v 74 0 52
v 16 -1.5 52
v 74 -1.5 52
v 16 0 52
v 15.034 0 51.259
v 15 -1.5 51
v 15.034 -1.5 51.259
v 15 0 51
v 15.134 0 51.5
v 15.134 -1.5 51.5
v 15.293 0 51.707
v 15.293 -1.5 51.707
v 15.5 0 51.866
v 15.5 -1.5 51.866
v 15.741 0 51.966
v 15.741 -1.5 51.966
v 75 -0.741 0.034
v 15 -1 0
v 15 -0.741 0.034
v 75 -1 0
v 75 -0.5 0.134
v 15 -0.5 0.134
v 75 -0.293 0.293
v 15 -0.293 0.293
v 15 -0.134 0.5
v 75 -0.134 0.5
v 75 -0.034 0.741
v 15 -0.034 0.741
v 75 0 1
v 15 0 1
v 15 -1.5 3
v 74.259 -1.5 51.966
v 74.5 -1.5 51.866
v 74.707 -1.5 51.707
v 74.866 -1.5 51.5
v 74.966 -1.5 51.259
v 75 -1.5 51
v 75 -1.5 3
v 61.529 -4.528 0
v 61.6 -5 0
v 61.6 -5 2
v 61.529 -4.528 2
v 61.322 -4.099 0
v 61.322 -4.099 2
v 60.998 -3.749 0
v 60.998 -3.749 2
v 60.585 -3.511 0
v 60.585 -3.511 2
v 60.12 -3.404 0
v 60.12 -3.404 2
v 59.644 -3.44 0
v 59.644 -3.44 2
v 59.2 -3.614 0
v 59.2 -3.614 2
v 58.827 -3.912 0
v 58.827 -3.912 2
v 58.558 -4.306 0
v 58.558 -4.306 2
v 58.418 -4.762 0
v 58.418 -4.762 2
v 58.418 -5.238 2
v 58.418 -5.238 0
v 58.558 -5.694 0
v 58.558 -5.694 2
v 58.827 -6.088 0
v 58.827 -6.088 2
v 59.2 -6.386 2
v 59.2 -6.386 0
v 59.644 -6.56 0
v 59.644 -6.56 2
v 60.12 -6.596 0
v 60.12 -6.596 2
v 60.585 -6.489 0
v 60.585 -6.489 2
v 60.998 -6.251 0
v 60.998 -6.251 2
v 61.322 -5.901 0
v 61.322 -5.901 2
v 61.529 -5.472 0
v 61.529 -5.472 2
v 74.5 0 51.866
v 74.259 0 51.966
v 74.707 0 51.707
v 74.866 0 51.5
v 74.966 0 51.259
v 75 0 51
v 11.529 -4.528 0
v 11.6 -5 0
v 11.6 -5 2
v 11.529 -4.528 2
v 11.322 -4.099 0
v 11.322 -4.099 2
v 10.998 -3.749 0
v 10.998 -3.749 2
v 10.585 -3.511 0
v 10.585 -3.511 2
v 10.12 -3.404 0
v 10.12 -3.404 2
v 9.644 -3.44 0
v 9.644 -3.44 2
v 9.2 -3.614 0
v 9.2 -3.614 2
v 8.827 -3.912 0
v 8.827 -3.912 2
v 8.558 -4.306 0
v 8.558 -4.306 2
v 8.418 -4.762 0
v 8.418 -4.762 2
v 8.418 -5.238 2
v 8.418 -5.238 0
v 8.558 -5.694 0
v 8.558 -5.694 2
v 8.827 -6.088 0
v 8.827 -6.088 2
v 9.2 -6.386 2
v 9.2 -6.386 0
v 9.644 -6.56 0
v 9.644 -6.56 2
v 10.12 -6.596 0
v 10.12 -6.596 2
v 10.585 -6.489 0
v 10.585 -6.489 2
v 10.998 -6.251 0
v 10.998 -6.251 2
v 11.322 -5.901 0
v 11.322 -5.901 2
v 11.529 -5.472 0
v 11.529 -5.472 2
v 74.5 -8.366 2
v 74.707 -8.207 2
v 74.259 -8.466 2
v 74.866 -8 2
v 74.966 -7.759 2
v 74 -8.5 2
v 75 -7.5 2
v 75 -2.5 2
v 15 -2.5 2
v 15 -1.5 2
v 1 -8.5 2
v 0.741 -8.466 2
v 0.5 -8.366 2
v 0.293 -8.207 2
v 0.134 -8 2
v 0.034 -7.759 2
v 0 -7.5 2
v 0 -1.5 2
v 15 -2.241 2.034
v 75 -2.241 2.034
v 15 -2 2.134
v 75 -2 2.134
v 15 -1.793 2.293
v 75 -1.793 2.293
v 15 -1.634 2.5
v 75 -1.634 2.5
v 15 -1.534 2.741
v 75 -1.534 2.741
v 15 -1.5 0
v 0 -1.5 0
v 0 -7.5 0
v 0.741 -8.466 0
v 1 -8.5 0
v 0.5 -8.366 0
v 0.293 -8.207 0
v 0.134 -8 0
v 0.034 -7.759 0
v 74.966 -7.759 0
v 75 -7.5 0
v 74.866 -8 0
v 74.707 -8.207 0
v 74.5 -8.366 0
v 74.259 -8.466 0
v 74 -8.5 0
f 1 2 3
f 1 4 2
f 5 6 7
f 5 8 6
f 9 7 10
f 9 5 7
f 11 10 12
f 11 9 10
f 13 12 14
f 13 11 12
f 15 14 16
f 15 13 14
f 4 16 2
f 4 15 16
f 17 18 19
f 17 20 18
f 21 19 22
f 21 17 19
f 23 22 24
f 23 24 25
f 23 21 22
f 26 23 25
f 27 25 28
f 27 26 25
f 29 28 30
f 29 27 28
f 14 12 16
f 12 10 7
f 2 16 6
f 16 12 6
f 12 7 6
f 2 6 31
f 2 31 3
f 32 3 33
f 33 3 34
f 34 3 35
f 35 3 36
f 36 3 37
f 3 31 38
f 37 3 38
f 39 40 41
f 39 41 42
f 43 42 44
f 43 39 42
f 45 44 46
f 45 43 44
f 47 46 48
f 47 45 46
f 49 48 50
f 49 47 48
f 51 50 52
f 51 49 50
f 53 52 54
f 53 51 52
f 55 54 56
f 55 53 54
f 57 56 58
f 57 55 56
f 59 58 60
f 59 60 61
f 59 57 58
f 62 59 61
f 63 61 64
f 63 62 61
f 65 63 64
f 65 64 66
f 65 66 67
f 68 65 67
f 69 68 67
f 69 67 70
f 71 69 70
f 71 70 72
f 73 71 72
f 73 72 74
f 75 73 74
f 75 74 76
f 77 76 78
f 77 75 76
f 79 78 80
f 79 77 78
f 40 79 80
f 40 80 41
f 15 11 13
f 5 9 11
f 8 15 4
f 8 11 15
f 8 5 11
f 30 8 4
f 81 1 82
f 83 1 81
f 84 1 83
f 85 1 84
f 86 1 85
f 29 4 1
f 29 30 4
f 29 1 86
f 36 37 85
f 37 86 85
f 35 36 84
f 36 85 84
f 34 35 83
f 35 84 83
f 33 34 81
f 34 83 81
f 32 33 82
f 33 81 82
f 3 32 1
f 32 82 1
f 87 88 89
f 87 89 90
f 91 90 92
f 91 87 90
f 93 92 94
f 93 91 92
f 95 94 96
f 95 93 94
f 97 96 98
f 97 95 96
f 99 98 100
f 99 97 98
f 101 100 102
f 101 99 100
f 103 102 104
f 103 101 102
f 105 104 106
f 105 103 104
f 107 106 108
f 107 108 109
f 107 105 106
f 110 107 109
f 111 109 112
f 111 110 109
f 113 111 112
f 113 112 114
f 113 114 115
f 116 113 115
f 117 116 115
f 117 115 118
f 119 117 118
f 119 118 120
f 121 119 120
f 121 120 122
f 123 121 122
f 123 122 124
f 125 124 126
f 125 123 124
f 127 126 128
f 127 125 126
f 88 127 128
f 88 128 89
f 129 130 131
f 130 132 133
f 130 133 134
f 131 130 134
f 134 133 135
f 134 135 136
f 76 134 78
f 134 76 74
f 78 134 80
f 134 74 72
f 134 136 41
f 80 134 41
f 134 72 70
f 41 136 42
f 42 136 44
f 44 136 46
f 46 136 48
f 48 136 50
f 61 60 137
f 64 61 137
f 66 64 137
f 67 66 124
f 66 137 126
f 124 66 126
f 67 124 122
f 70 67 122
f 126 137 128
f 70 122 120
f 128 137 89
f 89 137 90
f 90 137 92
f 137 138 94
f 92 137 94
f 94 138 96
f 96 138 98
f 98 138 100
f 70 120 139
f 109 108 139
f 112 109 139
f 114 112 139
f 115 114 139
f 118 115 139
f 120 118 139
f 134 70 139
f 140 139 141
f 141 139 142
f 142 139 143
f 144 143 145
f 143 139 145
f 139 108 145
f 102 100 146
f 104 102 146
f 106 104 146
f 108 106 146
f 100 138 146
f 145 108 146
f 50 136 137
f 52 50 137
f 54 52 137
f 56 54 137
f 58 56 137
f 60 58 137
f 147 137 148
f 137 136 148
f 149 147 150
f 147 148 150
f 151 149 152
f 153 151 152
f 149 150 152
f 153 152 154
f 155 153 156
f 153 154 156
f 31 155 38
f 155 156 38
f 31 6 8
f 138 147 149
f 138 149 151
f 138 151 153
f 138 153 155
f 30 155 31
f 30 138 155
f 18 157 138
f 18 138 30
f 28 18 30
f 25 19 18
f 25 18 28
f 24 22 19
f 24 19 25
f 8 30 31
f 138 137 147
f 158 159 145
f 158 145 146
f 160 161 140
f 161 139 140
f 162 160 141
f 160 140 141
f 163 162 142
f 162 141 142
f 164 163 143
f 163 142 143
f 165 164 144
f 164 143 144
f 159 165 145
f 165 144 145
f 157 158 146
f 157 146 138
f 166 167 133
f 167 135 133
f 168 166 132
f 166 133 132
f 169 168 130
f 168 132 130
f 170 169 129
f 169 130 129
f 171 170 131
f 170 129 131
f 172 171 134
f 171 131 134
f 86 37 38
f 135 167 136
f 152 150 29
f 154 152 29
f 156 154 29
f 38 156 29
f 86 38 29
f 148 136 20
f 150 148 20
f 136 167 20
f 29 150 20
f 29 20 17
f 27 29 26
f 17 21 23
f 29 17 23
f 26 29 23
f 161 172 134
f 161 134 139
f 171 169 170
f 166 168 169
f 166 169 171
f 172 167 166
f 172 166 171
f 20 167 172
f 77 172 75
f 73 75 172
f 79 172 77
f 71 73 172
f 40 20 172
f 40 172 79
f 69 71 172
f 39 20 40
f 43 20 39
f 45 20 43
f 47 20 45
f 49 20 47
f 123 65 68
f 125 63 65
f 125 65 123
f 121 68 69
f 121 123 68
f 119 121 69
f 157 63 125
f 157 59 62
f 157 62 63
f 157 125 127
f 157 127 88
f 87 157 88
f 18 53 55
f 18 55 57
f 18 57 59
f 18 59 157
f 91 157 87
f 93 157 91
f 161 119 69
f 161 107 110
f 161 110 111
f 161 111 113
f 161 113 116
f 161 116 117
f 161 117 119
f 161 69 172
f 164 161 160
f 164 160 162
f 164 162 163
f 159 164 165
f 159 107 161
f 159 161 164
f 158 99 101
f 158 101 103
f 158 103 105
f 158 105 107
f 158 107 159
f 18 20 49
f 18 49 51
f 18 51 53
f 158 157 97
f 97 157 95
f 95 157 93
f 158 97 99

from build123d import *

# Parameters (mm, degrees)
SKETCH_1_R      = 1.6
EXTRUDE_1_DEPTH = 2
SKETCH_2_W      = 60
SKETCH_2_H      = 1.5
EXTRUDE_2_DEPTH = 50
FILLET_1_R      = 1


with BuildPart() as part:
    # 草图1 → 凸台-拉伸1 (new body)
    with BuildSketch(Plane.XY):
        Polygon((15, 0), (75, 0), (75, -8.5), (0, -8.5), (0, -1.5), (15, -1.5), align=None)
        with Locations((10, -5)):
            Circle(SKETCH_1_R, mode=Mode.SUBTRACT)
        with Locations((60, -5)):
            Circle(SKETCH_1_R, mode=Mode.SUBTRACT)
    extrude(amount=EXTRUDE_1_DEPTH)

    # 草图2 → 凸台-拉伸2 (add)
    with BuildSketch(Plane.XY.offset(2)):
        with Locations((45, -0.75)):
            Rectangle(SKETCH_2_W, SKETCH_2_H)
    extrude(amount=EXTRUDE_2_DEPTH)

    # 圆角1
    fillet_1_edges = [part.edges().sort_by_distance(p)[0] for p in [
        (75, -8.5, 1),
        (0, -8.5, 1),
        (45, -1.5, 2),
        (15, -0.75, 52),
        (75, -0.75, 52),
        (45, 0, 0),
    ]]
    fillet(fillet_1_edges, radius=FILLET_1_R)


solid = part.part
